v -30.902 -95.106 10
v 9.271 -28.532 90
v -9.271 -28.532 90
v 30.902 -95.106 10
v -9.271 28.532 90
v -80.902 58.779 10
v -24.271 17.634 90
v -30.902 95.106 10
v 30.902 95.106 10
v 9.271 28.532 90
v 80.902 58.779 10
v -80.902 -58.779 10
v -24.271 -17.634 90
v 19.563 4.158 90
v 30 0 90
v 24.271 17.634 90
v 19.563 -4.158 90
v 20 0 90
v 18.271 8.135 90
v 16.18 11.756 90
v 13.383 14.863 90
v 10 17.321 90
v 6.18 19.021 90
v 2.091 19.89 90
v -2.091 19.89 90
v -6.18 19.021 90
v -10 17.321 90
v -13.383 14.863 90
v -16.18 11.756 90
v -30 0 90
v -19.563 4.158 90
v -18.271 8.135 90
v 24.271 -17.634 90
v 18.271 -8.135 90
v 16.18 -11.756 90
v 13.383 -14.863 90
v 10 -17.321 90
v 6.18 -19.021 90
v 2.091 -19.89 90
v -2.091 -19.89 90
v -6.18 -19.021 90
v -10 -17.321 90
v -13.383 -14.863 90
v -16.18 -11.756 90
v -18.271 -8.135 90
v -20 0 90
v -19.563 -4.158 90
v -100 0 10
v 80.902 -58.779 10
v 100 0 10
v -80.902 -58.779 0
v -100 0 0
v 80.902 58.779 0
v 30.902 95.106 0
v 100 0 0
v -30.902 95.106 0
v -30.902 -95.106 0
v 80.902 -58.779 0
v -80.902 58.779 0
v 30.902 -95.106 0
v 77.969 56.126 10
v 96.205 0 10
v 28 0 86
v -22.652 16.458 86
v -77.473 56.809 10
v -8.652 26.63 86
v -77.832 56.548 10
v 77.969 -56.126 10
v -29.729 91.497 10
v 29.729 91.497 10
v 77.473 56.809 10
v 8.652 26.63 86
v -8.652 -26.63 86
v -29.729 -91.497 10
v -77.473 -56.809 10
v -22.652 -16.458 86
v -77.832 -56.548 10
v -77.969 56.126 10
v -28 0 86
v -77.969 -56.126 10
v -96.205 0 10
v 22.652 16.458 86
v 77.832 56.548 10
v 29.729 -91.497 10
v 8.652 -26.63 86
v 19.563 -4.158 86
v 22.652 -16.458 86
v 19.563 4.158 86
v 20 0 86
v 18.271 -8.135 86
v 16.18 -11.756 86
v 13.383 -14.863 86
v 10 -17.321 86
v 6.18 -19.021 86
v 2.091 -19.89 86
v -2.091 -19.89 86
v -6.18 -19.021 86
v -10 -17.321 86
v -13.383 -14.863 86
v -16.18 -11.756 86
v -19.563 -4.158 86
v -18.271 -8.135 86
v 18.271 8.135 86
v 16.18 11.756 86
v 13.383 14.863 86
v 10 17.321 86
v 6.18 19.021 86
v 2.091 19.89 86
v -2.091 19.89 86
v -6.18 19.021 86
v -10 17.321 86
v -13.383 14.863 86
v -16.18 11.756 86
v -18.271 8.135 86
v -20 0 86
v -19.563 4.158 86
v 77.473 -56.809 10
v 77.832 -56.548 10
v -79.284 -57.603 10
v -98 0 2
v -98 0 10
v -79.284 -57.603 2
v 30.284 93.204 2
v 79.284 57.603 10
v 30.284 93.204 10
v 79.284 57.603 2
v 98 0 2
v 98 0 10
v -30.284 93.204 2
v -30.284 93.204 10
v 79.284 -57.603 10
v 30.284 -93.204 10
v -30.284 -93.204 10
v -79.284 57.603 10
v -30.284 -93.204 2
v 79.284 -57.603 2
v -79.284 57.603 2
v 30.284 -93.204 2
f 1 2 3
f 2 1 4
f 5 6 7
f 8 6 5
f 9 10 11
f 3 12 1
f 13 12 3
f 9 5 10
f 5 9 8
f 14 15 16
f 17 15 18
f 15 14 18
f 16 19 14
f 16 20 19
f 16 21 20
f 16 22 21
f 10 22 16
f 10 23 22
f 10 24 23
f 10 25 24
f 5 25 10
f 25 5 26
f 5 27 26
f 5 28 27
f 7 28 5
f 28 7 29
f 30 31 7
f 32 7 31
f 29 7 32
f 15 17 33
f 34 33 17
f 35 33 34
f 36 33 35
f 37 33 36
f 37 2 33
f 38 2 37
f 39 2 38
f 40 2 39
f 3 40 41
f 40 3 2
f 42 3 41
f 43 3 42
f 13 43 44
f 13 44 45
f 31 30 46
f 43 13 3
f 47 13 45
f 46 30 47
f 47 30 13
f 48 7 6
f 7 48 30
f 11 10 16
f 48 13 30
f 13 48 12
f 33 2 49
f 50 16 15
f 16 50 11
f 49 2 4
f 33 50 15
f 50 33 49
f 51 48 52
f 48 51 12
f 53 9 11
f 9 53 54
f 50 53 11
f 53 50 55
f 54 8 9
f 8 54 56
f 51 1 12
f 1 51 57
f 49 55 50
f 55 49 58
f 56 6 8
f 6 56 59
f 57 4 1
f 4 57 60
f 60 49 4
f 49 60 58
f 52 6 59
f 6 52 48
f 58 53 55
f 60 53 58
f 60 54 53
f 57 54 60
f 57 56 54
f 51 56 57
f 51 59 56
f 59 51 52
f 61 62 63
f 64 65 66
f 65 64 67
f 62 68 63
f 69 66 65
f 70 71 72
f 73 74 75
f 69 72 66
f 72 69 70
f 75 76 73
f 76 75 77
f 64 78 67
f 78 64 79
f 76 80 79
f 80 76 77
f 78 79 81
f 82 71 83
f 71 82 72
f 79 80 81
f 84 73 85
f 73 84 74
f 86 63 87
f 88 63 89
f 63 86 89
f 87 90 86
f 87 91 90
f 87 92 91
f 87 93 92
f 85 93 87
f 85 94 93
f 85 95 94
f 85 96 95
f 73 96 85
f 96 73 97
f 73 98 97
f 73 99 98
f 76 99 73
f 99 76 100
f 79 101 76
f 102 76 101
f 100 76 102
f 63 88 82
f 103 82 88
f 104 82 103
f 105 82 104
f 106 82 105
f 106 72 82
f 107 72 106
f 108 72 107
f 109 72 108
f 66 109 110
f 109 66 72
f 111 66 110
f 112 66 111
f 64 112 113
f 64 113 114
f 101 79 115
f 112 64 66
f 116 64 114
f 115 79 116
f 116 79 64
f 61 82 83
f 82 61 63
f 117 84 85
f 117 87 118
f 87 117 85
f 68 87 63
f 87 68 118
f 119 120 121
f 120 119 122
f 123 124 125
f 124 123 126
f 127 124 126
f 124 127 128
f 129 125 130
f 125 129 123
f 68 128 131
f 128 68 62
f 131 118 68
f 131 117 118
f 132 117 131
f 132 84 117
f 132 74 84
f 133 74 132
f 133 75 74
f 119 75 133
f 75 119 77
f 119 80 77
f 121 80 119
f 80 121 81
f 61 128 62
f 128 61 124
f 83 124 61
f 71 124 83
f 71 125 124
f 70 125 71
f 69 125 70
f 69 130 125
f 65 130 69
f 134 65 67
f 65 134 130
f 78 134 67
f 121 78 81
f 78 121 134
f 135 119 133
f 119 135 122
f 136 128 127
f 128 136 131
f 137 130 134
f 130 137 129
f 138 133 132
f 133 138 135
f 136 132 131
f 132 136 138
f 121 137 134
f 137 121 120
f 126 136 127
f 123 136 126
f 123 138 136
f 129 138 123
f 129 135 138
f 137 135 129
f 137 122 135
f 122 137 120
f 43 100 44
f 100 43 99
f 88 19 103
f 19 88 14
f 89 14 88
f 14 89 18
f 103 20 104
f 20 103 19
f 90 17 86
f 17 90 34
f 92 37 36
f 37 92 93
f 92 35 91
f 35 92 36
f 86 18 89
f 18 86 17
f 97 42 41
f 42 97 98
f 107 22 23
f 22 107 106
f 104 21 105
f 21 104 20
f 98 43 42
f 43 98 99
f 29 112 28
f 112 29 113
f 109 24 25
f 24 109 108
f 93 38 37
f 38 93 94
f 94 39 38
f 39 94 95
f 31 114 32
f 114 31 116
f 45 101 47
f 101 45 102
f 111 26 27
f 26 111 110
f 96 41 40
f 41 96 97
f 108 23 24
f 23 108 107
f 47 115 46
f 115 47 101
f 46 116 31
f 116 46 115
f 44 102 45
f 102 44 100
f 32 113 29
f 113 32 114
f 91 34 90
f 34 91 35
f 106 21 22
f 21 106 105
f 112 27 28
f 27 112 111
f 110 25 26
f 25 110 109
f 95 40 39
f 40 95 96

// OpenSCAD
r1 = 100; // Tank lower radius
r2 = 30; // Tank upper radius
h = 80; // Tank height
bh = 10; // Base height
fn = 10; // Number of sides
t = 2; // Tank thickness
hw = 20; // Hole width

difference() {
    shell();
    translate([0, 0, t+bh]) cylinder(h, hw, hw);
}

module shell() {
    difference() {
        base();
        base_inner();
    }
}

module base() {
   translate([0,0,bh]) cylinder(h, r1, r2, $fn=fn);
   cylinder(bh, r1, r1, $fn=fn);
}

module base_inner() {
   translate([0,0,bh-t]) cylinder(h-t, r1-t, r2-t, $fn=fn);
   translate([0,0,t]) cylinder(bh-t, r1-t, r1-t, $fn=fn);
}
